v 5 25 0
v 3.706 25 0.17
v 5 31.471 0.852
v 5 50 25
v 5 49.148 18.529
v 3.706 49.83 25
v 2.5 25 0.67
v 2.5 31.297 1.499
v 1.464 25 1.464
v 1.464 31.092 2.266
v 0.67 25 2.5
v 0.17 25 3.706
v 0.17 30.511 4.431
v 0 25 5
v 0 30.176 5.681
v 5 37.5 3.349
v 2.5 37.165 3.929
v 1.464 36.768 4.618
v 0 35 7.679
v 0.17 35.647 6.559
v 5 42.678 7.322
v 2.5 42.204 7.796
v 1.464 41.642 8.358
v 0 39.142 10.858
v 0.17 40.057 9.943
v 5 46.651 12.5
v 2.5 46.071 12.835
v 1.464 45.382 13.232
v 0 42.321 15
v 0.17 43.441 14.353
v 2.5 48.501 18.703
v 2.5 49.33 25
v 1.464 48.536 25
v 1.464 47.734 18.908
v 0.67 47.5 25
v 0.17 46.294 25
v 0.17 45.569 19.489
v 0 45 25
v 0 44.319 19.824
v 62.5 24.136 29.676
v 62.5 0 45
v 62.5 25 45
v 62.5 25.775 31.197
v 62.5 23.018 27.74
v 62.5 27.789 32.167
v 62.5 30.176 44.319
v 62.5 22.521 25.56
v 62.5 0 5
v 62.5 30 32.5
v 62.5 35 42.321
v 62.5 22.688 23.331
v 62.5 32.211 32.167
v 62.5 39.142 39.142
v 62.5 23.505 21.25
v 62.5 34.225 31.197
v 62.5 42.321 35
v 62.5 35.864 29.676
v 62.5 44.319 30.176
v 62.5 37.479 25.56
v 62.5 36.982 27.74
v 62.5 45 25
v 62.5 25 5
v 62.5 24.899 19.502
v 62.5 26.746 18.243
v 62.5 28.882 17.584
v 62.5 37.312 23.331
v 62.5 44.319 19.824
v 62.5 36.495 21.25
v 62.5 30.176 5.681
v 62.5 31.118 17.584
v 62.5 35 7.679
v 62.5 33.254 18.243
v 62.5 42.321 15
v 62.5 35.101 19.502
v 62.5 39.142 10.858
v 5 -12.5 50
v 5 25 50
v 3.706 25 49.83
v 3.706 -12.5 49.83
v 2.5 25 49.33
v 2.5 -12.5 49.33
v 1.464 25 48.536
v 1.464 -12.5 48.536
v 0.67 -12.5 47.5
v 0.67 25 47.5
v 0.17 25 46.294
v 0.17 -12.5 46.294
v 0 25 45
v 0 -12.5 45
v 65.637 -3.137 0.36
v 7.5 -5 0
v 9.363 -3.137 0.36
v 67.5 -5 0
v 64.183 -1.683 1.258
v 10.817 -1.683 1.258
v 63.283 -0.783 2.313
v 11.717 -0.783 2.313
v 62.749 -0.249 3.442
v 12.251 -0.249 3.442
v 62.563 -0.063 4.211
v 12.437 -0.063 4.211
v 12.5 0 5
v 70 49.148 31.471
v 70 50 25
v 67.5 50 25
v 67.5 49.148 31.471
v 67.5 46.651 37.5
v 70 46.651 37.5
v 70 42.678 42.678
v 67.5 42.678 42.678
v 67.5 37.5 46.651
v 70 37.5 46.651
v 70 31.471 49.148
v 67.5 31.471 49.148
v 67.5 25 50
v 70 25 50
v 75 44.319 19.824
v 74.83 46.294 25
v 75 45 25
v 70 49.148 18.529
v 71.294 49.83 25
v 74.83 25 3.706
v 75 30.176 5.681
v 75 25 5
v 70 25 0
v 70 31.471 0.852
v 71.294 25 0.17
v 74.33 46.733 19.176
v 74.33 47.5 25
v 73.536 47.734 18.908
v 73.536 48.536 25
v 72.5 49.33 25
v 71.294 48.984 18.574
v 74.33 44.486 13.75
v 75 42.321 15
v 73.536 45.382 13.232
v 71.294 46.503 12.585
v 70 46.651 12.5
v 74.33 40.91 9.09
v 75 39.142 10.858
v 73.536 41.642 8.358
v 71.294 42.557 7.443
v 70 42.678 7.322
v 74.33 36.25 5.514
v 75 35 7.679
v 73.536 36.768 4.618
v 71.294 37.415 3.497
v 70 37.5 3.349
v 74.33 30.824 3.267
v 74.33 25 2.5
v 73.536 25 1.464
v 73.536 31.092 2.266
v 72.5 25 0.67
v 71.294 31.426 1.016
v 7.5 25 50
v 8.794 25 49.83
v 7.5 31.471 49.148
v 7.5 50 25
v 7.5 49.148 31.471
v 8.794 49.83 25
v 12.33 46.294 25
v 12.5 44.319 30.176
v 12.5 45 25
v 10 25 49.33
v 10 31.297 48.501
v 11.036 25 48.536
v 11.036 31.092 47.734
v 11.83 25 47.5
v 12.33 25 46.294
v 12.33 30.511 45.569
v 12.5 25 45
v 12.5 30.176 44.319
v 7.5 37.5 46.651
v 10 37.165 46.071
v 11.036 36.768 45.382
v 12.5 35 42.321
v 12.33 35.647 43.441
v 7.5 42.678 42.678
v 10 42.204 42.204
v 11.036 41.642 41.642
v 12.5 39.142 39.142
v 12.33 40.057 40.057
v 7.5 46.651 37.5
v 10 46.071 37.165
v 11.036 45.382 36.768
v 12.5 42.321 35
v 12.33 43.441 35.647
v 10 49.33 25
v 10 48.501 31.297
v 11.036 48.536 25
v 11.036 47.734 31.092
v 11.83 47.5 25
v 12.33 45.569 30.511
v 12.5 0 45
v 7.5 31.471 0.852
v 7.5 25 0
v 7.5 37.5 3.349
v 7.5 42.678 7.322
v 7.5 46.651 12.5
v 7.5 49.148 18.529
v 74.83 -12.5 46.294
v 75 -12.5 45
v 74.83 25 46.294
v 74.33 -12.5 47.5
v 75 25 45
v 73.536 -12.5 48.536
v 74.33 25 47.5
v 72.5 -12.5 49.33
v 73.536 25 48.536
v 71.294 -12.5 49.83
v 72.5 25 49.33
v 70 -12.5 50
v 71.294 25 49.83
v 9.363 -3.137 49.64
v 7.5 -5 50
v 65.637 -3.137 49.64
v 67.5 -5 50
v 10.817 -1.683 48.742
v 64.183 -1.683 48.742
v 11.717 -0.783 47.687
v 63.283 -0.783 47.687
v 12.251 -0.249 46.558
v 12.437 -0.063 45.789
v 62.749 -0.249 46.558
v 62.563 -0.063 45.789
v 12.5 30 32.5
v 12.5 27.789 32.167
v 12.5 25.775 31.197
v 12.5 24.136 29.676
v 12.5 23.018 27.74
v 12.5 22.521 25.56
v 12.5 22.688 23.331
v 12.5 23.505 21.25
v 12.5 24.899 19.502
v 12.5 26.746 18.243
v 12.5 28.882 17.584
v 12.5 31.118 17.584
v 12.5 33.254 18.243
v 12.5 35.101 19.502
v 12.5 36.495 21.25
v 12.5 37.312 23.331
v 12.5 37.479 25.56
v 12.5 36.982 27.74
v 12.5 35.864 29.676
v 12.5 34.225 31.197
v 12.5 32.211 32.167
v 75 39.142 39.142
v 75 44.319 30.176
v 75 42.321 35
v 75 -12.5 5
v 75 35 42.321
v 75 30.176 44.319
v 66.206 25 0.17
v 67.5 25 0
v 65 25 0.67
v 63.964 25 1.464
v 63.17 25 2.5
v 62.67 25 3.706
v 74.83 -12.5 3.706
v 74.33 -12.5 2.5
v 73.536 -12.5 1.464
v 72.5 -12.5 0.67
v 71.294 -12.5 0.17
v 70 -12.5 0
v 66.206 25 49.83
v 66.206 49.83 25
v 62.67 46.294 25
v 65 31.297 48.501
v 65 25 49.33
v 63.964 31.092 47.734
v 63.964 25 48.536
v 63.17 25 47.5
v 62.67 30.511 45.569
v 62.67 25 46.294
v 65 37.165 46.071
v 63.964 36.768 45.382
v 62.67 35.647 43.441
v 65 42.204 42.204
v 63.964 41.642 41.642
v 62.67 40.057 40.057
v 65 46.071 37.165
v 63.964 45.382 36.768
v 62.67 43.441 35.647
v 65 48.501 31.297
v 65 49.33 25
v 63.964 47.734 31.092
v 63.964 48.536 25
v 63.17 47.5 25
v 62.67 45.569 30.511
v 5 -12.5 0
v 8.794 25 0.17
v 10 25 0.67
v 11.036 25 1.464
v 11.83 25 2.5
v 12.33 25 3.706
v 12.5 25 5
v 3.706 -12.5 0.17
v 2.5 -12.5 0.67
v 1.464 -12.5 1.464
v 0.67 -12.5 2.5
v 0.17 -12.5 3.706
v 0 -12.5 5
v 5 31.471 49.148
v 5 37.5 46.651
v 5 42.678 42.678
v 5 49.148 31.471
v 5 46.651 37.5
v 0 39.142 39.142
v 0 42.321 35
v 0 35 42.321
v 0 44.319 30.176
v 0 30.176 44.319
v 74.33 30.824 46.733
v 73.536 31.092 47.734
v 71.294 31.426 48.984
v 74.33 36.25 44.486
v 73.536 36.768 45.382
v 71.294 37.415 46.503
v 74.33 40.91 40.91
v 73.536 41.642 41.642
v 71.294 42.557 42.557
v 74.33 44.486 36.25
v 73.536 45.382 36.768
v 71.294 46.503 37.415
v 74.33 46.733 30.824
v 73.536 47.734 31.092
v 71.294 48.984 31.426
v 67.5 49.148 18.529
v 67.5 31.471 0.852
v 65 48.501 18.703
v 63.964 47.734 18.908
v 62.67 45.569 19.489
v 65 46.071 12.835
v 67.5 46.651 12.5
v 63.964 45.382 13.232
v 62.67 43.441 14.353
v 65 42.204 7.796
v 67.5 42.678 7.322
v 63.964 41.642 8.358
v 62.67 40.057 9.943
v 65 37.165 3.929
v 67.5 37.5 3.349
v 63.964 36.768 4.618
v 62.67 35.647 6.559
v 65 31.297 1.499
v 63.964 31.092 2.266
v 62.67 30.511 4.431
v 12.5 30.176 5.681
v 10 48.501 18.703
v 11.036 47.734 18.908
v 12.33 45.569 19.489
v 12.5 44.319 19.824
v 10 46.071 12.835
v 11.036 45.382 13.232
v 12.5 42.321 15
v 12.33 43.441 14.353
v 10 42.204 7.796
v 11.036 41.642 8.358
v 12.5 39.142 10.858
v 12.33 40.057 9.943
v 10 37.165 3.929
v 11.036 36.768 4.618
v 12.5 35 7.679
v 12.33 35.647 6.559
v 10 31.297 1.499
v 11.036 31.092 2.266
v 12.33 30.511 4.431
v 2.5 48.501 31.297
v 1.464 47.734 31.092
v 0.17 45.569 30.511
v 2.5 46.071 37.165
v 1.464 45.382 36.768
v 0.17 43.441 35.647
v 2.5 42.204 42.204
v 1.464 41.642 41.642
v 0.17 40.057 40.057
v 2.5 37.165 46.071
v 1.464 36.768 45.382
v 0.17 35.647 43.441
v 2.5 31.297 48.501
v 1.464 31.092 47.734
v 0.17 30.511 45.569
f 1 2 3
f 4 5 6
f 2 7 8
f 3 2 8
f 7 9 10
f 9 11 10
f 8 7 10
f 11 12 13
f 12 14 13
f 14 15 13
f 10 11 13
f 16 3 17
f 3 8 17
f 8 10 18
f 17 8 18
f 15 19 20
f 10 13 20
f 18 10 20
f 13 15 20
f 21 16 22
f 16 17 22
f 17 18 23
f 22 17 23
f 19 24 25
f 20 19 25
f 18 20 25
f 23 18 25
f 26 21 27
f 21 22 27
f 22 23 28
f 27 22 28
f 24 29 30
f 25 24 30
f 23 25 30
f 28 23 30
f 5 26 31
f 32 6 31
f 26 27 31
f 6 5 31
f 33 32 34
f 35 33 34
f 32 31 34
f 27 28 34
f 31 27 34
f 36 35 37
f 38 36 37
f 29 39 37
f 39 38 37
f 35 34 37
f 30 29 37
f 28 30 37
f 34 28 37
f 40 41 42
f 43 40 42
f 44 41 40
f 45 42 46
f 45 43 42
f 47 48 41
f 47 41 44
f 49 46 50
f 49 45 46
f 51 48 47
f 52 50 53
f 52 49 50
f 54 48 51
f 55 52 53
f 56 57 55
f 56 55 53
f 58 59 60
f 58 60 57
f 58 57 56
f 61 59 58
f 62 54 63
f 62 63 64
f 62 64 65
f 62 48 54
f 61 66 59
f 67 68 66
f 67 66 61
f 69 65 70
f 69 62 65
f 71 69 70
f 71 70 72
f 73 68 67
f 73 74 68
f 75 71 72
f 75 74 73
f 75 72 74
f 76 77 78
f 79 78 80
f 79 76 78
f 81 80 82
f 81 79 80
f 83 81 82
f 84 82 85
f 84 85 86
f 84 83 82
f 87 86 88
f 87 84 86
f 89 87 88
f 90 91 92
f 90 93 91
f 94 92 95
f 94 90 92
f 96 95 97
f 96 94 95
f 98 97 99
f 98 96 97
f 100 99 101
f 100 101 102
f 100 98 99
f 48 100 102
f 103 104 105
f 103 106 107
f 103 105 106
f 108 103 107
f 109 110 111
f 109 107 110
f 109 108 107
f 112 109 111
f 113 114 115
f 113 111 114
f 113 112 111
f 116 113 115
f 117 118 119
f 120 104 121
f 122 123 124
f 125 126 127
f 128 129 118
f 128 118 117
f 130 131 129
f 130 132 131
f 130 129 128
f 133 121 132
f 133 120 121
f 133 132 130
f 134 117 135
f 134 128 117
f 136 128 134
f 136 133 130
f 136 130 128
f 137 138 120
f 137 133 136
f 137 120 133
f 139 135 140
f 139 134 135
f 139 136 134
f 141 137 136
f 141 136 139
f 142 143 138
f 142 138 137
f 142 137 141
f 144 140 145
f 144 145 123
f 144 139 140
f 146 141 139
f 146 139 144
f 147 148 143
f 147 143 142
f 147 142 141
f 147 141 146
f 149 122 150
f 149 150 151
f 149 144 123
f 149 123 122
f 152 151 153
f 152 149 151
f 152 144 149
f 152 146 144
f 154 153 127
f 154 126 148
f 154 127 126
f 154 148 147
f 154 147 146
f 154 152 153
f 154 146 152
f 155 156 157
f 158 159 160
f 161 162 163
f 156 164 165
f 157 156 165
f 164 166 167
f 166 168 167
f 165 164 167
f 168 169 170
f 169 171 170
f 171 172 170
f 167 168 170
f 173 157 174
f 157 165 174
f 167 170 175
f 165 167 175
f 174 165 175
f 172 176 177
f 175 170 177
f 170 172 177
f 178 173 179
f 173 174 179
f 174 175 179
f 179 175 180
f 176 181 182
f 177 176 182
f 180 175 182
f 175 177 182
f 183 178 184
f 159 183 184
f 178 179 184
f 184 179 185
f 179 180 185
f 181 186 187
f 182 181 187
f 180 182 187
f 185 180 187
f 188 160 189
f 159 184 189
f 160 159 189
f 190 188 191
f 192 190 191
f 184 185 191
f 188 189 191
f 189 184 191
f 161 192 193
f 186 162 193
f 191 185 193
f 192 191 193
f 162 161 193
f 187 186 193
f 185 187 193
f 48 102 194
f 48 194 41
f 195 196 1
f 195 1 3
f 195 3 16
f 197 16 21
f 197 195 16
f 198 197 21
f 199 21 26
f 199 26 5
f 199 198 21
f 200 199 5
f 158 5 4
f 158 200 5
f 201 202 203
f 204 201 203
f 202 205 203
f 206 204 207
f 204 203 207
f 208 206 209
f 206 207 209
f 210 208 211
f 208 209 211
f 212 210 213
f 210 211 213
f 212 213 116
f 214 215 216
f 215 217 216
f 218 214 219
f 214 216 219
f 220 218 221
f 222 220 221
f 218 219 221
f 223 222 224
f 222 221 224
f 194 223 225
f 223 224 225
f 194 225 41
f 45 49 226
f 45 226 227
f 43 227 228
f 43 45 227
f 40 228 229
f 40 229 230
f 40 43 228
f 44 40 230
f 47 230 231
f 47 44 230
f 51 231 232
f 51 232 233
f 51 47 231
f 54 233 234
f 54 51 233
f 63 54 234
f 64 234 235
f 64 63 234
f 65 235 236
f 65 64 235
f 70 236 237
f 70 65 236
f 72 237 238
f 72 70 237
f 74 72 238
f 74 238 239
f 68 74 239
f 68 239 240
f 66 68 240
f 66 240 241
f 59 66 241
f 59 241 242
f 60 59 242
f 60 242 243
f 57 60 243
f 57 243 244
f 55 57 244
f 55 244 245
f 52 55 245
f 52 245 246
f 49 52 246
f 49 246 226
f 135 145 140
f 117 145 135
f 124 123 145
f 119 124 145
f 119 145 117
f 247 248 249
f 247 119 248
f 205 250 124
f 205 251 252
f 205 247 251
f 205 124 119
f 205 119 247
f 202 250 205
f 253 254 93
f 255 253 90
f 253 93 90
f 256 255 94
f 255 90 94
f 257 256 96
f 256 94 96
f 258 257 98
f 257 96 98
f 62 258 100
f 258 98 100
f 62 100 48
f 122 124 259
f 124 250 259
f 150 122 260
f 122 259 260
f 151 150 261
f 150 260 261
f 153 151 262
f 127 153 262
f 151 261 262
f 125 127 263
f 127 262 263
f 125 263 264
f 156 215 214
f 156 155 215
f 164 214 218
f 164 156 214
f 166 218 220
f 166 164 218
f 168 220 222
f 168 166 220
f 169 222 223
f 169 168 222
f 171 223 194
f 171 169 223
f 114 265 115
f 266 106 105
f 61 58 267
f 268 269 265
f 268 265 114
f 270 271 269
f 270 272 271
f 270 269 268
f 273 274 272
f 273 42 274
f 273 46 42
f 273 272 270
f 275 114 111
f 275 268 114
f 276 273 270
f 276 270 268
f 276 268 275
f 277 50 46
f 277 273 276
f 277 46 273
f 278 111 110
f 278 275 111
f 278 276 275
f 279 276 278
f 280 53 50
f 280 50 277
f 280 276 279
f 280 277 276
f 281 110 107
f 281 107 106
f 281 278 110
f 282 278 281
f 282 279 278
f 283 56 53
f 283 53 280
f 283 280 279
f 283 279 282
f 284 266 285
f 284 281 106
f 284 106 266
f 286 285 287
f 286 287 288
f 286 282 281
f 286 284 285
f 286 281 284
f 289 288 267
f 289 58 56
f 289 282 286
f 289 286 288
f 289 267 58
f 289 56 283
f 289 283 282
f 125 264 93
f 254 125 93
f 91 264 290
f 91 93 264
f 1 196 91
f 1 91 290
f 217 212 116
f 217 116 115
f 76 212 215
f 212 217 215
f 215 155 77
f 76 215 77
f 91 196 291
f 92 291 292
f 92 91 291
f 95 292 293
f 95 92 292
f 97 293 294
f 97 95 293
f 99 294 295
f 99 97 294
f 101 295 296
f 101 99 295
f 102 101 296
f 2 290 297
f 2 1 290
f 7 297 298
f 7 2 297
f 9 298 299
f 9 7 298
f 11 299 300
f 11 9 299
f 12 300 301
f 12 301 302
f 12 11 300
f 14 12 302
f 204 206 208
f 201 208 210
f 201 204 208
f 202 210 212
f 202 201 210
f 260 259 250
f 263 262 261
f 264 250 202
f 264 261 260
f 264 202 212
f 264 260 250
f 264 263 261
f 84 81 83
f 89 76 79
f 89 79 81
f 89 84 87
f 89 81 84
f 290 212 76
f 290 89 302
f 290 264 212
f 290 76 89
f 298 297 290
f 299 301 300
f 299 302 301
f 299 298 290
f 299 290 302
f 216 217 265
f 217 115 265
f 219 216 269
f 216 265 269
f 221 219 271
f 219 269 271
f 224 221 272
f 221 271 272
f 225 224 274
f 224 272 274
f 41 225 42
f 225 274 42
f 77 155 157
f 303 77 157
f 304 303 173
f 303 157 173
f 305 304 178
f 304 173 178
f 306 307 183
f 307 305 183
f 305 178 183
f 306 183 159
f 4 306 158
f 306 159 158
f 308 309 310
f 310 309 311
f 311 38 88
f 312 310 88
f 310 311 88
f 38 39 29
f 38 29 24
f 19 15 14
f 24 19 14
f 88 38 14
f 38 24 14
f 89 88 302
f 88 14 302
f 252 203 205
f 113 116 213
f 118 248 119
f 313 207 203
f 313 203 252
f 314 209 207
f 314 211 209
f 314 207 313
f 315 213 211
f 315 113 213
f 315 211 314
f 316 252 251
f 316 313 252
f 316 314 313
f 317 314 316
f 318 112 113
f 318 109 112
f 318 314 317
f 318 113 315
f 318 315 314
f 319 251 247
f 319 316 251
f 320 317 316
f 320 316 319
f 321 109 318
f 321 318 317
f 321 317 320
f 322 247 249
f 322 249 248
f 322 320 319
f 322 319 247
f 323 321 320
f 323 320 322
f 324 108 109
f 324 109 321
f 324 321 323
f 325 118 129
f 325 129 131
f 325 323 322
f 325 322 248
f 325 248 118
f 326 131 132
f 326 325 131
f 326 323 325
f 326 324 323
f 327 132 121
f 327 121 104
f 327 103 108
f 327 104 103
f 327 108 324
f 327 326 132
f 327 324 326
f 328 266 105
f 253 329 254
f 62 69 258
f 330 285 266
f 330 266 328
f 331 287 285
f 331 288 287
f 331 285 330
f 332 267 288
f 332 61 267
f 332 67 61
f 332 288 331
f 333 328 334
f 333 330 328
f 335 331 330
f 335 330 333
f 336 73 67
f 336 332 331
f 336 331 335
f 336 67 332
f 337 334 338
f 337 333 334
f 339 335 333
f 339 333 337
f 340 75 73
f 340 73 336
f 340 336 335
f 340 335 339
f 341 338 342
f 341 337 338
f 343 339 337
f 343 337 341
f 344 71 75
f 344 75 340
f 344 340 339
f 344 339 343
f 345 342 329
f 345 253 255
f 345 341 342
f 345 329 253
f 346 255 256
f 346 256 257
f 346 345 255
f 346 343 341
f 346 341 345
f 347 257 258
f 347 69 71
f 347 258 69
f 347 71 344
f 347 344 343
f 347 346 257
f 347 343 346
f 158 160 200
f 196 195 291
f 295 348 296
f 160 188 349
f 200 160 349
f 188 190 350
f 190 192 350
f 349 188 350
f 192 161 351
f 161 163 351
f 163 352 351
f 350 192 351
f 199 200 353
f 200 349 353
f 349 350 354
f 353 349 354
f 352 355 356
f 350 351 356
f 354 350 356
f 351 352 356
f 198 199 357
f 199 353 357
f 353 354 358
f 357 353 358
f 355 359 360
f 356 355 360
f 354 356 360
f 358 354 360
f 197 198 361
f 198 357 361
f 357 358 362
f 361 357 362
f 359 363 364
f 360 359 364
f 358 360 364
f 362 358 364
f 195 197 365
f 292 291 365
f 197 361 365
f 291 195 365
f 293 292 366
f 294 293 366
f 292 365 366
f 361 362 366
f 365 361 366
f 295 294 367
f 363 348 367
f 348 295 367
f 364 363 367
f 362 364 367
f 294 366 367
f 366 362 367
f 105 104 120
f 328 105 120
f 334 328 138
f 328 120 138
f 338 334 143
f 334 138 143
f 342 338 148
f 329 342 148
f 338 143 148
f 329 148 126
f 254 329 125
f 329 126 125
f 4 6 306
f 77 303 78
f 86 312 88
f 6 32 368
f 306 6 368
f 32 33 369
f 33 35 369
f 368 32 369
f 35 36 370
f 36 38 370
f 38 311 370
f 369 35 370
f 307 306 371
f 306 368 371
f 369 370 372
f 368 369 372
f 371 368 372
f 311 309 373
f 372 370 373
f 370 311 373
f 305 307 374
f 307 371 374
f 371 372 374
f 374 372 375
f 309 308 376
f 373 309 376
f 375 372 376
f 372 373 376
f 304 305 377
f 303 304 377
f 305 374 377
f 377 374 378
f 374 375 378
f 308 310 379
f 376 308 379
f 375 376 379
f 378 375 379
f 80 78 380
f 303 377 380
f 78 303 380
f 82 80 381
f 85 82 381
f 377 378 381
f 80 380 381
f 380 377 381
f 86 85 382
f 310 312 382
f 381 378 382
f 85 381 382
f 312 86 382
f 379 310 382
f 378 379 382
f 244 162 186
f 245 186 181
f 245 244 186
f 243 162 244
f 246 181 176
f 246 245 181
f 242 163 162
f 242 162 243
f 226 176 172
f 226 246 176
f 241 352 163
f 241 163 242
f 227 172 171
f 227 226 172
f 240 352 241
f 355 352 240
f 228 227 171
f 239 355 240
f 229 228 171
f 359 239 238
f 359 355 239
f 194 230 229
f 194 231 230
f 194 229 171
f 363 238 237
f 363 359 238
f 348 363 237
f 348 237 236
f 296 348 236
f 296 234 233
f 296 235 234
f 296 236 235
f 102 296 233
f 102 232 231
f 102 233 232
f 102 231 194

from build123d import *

# Parameters (mm, degrees)
SALIENTE_EXTRUIR1_DEPTH = 50
CROQUIS2_R              = 7.5
SALIENTE_EXTRUIR2_DEPTH = 75
REDONDEO1_R             = 25
REDONDEO2_R             = 5


with BuildPart() as part:
    # Croquis1 → Saliente-Extruir1 (new body)
    with BuildSketch(Plane.XY):
        Polygon((0, 0), (0, 50), (12.5, 50), (12.5, 0), (62.5, 0), (62.5, 50), (75, 50), (75, -12.5), (0, -12.5), align=None)
    extrude(amount=SALIENTE_EXTRUIR1_DEPTH)

    # Croquis2 → Saliente-Extruir2 (add)
    with BuildSketch(Plane(origin=(75, 0, 0), x_dir=(0, 0, -1), z_dir=(1, 0, 0))):
        with Locations(Location((-25, 30, 0), (0, 0, 180))):
            Circle(CROQUIS2_R)
    extrude(amount=-SALIENTE_EXTRUIR2_DEPTH)

    # Redondeo1
    redondeo1_edges = [part.edges().sort_by_distance(p)[0] for p in [
        (6.25, 50, 0),
        (6.25, 50, 50),
        (68.75, 50, 50),
        (68.75, 50, 0),
    ]]
    fillet(redondeo1_edges, radius=REDONDEO1_R - 0.0001)  # a hair under: the kernel refuses the full size

    # Redondeo2
    redondeo2_edges = [part.edges().sort_by_distance(p)[0] for p in [
        (0, 6.25005, 50),
        (0, 6.25005, 0),
        (37.5, 0, 50),
        (62.5, 12.50005, 50),
        (75, 6.25005, 0),
        (12.5, 12.50005, 0),
        (12.5, 12.50005, 50),
        (12.5, 42.677698819, 42.677698819),
        (12.5, 42.677698819, 7.322301181),
        (0, 42.677698819, 42.677698819),
        (0, 42.677698819, 7.322301181),
        (75, 6.25005, 50),
        (75, 42.677698819, 7.322301181),
        (75, 42.677698819, 42.677698819),
        (62.5, 42.677698819, 7.322301181),
        (62.5, 42.677698819, 42.677698819),
        (62.5, 12.50005, 0),
        (37.5, 0, 0),
    ]]
    fillet(redondeo2_edges, radius=REDONDEO2_R)


solid = part.part
